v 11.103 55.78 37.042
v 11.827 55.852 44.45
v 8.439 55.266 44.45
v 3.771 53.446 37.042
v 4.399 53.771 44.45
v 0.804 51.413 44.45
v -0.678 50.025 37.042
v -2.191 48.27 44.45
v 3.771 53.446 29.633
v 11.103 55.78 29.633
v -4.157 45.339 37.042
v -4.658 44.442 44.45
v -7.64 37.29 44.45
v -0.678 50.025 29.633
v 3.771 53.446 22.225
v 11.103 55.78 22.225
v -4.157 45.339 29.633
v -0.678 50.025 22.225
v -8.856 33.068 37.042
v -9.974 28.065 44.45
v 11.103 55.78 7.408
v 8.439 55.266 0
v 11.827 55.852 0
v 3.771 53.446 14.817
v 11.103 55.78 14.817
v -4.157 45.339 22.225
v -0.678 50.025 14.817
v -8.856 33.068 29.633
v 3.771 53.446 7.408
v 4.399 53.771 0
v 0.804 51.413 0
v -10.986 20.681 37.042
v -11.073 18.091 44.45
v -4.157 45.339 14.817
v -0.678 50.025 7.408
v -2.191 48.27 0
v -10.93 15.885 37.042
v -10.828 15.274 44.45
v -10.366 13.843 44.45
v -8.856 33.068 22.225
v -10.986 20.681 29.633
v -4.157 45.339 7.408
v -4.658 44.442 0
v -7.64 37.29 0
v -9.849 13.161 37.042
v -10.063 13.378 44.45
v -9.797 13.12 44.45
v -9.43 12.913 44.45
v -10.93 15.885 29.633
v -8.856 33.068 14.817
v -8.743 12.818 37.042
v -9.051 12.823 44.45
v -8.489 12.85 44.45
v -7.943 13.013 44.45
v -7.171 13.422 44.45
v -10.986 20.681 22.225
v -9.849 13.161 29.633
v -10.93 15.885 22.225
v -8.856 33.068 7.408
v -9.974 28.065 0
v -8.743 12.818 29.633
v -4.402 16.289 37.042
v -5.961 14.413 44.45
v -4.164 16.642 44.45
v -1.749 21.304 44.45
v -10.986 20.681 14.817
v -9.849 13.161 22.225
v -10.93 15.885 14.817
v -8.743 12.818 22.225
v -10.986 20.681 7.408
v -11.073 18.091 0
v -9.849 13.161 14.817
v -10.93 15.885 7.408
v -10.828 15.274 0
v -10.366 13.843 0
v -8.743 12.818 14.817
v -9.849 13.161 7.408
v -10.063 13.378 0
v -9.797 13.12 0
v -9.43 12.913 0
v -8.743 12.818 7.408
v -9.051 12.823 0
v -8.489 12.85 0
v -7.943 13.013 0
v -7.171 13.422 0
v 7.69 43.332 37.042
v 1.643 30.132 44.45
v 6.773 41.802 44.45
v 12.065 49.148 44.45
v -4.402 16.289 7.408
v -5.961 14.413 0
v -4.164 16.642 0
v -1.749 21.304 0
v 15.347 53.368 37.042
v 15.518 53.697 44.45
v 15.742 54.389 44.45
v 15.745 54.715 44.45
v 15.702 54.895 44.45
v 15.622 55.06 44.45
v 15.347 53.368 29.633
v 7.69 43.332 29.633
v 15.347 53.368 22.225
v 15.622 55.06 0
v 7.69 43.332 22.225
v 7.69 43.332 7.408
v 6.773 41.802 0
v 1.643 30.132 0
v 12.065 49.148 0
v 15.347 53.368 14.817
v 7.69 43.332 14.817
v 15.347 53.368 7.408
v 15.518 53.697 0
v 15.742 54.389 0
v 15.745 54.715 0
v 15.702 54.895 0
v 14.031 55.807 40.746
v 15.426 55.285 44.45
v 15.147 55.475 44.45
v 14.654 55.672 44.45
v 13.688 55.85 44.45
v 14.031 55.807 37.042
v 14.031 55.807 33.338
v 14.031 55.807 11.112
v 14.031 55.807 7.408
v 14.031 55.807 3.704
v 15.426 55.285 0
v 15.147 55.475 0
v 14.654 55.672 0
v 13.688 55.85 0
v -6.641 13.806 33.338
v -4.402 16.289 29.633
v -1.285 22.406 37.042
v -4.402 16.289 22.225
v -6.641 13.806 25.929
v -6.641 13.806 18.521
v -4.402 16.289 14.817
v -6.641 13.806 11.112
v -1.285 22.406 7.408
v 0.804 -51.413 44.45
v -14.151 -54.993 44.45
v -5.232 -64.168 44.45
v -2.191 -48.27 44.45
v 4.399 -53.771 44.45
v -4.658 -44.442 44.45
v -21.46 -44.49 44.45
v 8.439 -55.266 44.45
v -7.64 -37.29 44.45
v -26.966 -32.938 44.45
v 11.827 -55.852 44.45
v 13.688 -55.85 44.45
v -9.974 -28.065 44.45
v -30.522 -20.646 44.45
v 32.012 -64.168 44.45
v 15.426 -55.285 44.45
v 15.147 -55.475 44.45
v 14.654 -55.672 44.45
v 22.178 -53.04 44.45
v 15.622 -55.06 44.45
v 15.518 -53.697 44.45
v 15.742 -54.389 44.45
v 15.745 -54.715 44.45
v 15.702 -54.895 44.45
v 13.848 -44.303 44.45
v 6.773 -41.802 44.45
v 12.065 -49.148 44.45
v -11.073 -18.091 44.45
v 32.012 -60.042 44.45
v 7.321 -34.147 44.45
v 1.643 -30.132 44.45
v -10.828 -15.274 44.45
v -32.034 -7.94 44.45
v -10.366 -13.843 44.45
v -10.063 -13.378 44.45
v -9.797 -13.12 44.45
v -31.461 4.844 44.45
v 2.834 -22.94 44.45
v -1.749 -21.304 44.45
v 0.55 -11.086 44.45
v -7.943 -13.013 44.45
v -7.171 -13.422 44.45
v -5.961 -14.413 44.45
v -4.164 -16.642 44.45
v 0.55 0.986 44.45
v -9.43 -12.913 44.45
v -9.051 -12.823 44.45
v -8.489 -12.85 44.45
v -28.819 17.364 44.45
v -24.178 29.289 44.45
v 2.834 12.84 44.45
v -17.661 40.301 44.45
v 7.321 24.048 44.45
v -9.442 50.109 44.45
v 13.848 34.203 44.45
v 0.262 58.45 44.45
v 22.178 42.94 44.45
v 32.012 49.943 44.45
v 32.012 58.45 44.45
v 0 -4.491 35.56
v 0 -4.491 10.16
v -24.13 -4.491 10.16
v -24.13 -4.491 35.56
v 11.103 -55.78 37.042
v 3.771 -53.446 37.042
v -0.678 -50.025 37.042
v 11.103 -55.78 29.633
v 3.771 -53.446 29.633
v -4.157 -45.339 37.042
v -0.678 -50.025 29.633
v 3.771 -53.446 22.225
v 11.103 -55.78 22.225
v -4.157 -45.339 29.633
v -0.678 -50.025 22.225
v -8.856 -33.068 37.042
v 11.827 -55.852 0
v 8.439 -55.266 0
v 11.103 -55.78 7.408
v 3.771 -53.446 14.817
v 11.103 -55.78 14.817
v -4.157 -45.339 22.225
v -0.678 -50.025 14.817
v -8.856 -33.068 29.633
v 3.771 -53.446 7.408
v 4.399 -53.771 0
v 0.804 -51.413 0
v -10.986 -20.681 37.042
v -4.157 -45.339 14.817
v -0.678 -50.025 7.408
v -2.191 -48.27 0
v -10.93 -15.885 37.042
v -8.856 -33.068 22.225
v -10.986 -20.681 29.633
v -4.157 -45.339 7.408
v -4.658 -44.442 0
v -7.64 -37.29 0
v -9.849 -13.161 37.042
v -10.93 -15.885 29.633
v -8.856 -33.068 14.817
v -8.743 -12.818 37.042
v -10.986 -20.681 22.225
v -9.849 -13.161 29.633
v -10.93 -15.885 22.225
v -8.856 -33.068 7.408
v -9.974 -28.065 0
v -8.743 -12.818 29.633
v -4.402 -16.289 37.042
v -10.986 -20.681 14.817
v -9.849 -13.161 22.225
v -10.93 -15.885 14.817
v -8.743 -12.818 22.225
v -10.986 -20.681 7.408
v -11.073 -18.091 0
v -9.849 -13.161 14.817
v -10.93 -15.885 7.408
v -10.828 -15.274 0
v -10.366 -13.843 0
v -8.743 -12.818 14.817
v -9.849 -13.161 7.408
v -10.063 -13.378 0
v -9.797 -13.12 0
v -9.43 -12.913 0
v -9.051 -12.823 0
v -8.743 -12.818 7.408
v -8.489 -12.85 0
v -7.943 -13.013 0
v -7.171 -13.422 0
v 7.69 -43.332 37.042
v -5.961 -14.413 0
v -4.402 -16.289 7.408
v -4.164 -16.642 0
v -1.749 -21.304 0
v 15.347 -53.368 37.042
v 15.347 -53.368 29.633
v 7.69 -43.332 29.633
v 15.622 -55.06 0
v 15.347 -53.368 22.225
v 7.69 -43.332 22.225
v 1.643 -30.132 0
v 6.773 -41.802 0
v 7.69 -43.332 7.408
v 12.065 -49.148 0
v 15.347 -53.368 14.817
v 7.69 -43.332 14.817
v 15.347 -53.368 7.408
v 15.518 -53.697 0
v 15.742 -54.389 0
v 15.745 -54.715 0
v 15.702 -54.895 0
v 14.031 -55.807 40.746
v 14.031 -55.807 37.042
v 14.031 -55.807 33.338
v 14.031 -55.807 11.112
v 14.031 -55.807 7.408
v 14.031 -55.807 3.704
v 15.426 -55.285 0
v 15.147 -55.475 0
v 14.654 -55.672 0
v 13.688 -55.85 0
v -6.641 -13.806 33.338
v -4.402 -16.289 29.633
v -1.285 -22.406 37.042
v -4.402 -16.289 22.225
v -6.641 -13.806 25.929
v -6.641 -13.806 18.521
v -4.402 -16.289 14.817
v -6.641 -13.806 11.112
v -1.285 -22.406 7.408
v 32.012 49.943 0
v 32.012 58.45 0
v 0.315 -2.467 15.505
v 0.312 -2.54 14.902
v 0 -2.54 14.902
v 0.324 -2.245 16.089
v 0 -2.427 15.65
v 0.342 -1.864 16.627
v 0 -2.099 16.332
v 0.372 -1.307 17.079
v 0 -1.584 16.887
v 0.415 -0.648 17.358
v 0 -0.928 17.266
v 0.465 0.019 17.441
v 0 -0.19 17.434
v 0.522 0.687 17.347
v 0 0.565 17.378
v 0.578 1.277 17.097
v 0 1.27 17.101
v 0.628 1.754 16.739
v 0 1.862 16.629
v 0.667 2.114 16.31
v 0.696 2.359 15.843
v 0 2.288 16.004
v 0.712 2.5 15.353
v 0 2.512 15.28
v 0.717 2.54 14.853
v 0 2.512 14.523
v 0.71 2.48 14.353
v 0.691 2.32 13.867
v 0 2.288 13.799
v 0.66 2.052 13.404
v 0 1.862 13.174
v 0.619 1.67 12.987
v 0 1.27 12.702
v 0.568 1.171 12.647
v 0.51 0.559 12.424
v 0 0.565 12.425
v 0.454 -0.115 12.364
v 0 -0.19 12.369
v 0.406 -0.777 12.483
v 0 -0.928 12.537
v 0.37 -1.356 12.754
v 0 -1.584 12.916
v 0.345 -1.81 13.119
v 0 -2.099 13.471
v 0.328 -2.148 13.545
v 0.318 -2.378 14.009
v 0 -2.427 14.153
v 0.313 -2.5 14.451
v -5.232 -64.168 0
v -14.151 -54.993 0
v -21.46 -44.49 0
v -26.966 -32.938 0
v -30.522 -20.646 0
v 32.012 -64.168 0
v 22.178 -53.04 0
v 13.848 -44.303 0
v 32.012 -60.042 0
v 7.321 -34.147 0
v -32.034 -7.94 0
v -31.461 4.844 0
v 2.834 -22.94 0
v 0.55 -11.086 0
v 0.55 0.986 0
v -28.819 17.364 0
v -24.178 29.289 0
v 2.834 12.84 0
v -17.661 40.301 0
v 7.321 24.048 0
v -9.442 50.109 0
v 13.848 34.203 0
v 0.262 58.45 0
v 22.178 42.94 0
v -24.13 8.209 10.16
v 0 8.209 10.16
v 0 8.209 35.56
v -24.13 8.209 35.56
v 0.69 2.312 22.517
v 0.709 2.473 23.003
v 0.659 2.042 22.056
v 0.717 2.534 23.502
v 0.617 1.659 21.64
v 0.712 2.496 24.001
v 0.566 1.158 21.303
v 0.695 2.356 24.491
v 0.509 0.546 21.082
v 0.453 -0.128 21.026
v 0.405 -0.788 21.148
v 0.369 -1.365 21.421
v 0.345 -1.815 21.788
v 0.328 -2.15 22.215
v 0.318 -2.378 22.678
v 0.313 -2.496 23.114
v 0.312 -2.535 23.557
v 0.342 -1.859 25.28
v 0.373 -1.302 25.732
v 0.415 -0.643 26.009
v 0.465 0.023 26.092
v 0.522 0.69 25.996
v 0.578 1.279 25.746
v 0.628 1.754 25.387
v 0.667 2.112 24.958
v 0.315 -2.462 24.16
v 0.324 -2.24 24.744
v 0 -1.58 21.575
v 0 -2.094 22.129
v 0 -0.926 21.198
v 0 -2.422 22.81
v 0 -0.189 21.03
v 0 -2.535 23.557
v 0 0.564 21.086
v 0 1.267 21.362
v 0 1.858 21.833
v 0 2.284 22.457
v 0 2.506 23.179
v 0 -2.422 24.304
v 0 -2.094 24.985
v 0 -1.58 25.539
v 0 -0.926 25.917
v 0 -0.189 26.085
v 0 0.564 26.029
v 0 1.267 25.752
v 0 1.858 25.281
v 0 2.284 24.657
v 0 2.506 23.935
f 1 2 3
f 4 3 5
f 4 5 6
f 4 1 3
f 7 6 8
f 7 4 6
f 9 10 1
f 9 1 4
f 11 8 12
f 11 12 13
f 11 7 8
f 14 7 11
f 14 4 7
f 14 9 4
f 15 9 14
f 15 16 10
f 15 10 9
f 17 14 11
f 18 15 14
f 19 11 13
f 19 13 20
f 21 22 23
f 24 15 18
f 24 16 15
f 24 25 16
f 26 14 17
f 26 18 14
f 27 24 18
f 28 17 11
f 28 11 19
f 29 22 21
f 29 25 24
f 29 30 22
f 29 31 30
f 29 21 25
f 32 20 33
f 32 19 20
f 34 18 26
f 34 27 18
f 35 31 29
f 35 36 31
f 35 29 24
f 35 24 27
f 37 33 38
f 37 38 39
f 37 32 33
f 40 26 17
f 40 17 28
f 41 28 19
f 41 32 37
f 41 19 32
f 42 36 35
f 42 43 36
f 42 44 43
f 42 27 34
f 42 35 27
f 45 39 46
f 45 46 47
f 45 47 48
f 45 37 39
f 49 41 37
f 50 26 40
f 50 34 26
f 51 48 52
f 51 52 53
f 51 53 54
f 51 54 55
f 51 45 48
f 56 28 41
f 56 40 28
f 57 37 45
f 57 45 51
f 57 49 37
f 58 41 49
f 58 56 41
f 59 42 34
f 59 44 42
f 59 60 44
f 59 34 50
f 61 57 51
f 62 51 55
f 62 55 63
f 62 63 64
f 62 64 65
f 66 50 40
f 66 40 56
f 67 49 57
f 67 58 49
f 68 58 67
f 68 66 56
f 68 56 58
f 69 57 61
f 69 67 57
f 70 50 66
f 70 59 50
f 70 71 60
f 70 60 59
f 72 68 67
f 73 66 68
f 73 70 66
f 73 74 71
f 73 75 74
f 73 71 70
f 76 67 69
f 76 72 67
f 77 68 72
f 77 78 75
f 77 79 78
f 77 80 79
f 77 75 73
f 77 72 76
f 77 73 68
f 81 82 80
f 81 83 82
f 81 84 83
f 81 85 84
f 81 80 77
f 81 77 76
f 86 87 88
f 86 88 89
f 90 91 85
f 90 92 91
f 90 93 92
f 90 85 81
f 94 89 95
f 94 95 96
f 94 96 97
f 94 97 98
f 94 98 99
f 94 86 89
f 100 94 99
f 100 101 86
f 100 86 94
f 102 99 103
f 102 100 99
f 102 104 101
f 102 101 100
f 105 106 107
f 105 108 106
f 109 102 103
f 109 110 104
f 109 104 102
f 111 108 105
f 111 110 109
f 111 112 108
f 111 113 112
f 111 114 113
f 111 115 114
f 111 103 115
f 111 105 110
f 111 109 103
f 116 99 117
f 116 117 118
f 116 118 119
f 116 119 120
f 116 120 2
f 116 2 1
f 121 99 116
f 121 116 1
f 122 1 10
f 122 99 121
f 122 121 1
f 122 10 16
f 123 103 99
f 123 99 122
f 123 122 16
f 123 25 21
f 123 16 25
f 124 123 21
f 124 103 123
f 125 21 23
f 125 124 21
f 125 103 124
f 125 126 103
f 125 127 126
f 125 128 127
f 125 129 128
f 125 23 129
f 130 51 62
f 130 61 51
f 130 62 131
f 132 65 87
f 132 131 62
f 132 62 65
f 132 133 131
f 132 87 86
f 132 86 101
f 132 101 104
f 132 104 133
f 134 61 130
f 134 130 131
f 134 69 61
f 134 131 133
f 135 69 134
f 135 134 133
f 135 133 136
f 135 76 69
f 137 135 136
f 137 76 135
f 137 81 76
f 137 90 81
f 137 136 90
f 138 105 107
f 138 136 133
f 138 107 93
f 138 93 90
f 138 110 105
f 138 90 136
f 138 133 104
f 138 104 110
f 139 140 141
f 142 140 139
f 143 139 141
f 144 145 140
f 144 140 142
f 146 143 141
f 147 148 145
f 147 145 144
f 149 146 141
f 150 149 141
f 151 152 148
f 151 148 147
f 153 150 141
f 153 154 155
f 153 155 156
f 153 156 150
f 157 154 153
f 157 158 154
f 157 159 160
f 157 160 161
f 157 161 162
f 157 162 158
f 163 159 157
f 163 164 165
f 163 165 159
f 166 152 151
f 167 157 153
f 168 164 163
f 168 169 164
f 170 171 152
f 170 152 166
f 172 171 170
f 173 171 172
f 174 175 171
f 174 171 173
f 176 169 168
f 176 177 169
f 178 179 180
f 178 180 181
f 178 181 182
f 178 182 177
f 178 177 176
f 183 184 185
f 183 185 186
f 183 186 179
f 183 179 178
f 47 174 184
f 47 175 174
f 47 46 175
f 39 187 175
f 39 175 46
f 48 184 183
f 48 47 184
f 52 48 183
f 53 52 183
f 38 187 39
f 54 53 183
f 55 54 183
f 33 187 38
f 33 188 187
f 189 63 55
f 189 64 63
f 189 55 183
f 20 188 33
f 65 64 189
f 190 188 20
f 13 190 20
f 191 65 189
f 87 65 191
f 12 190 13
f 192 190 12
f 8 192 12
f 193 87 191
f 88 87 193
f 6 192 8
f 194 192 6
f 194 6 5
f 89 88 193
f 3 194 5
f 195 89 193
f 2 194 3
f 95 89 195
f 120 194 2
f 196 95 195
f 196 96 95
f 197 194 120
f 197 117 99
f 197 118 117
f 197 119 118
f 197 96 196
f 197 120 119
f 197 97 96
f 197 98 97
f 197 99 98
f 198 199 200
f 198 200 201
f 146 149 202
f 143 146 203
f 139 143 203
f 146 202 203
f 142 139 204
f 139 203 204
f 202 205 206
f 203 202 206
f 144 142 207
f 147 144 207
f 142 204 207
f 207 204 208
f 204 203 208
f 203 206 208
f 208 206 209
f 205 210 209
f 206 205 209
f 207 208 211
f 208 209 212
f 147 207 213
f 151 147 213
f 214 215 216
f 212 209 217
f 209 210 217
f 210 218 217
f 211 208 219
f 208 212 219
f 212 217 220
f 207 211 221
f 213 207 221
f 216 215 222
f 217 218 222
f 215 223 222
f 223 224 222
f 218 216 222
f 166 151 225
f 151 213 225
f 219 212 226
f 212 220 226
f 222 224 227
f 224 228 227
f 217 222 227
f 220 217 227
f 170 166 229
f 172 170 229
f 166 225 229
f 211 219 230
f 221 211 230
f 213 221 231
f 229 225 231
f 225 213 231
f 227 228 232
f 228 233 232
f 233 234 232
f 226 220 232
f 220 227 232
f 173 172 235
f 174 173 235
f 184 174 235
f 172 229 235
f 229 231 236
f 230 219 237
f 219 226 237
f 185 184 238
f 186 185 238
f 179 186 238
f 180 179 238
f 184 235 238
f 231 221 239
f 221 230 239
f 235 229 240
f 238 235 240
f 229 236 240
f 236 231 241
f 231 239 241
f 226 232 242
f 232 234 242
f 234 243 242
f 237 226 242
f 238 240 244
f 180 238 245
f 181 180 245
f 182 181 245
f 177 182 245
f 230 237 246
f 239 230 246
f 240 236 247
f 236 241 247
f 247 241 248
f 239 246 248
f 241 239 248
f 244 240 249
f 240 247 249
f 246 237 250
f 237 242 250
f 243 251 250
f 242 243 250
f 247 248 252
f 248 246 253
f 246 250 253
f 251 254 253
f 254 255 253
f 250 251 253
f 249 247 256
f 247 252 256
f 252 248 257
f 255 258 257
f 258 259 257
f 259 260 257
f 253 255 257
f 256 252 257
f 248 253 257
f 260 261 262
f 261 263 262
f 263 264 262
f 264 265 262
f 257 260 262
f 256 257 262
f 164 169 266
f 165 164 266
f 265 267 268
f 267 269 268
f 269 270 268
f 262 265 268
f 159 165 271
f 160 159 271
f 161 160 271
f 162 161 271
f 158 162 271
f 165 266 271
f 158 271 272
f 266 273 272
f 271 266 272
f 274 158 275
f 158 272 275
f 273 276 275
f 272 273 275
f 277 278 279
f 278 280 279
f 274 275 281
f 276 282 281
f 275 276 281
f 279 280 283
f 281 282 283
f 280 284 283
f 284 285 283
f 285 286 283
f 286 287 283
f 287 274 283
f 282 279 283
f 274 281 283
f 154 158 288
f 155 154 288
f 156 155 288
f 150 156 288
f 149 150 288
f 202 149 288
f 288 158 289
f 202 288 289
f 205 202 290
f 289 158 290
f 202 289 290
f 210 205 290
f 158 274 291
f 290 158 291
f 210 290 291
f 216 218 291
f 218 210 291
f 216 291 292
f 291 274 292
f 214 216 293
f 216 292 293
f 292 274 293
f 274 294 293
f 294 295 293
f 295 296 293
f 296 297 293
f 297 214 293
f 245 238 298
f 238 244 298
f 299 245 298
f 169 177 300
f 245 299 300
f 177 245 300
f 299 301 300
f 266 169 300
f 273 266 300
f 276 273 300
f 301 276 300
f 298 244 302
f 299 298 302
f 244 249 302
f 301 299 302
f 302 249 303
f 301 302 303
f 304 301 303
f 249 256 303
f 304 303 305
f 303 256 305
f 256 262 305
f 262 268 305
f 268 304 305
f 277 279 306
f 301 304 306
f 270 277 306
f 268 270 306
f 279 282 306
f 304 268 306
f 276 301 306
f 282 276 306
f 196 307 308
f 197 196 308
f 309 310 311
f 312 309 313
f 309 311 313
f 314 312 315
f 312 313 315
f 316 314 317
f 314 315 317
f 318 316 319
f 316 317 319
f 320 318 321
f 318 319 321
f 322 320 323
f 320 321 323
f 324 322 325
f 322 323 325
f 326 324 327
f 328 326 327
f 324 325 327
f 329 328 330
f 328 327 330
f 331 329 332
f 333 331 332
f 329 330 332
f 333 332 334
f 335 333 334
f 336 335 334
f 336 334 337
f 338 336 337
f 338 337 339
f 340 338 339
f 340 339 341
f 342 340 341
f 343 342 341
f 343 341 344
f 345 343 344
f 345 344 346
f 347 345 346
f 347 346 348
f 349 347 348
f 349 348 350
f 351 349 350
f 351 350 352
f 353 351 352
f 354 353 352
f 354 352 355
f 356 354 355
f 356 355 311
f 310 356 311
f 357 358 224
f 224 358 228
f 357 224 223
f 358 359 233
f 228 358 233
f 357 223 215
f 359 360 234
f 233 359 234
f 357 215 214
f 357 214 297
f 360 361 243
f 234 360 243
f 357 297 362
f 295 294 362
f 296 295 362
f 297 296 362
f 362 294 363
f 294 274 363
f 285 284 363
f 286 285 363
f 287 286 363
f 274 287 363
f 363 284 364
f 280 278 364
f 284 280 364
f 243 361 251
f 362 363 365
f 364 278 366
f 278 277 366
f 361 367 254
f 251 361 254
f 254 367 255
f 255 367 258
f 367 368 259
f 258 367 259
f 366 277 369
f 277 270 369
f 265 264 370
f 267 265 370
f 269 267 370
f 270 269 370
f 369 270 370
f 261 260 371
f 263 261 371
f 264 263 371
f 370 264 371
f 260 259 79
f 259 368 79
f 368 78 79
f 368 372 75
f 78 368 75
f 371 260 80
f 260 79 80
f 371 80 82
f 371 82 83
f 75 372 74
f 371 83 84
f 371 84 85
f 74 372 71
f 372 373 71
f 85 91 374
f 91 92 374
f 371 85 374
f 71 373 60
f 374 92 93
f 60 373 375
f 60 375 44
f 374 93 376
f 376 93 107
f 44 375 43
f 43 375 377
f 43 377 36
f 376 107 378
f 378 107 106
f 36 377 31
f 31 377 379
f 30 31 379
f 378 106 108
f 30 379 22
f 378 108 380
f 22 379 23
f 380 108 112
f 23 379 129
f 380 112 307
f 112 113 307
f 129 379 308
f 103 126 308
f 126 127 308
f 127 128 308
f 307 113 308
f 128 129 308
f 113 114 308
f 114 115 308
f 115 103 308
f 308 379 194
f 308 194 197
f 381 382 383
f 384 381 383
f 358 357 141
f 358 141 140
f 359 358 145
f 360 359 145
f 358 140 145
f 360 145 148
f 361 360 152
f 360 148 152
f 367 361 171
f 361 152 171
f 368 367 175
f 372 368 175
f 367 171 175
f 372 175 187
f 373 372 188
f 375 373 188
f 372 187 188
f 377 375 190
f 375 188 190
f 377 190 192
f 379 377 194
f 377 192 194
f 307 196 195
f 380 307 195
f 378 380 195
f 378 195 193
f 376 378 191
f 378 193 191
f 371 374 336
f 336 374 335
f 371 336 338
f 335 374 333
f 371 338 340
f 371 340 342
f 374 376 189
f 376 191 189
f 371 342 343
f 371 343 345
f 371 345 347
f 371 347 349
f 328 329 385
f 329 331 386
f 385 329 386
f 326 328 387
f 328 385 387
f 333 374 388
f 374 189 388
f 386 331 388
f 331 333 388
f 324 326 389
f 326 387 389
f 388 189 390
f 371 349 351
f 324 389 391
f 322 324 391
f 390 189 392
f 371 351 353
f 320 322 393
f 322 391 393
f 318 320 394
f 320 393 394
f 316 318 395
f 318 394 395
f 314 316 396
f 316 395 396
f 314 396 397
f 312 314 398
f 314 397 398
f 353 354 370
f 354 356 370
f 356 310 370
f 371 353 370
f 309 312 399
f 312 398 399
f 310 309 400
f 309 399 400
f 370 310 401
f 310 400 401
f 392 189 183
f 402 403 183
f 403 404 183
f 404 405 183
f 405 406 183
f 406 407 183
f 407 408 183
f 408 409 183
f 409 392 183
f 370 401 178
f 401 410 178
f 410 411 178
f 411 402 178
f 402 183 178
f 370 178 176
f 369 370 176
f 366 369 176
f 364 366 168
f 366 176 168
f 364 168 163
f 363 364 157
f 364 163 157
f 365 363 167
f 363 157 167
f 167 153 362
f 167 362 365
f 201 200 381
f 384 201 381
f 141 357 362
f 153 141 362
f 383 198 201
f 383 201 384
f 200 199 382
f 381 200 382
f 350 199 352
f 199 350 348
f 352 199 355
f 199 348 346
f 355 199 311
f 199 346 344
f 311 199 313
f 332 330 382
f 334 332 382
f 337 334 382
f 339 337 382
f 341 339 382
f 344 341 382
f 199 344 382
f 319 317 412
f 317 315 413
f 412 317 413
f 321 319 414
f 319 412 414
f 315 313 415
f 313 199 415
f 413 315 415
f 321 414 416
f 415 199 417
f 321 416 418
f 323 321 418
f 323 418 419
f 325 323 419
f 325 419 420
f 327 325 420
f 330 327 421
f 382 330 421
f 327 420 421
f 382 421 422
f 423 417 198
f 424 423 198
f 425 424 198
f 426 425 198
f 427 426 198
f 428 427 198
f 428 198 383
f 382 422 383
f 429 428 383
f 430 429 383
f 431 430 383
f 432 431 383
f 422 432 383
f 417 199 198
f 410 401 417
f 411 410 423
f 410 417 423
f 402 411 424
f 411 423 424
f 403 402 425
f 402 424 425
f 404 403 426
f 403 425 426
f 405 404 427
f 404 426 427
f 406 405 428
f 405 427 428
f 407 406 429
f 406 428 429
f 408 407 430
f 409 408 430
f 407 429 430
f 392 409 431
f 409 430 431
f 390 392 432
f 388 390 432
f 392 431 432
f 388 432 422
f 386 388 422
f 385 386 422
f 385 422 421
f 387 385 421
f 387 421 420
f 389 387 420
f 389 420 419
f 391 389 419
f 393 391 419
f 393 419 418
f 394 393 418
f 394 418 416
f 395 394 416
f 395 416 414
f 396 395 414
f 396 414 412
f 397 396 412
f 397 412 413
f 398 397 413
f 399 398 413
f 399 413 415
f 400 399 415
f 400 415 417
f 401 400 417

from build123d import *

# Parameters (mm, degrees)
F0_W      = 127
F0_H      = 127
F1_DEPTH  = 44.45
F3_DEPTH  = 44.45
F5_DEPTH  = 44.45
F7_DEPTH  = 46.06675
F8_W      = 32.0189083815
F8_H      = 8.9123969463
F9_DEPTH  = 44.45
F10_W     = 31.75
F10_H     = 19.9242069336
F11_DEPTH = 44.45
F12_W     = 12.7
F12_H     = 25.4
F13_DEPTH = 24.13
F14_R     = 2.54
F14_R_2   = 2.5348059879
F15_DEPTH = 25.4
F17_DEPTH = 44.45
F18_W     = 44.9046668708
F18_H     = 4.3814008621
F19_DEPTH = 44.45
F20_DEPTH = 25


with BuildPart() as f1:
    # F0 (on Top) → F1 (new body)
    with BuildSketch(Plane.XY):
        with Locations((0.2620890737, -5.0497795728)):
            Rectangle(F0_W, F0_H)
    extrude(amount=F1_DEPTH)

    # F2 (on face) → F3 (cut, through all)
    with BuildSketch(Plane.XY.offset(44.45)):
        with BuildLine():
            Line((0.2620890737, 58.4502204272), (-63.2379109263, 58.4502204272))
            Line((-63.2379109263, 58.4502204272), (-63.2379109263, -68.5497795728))
            Line((-63.2379109263, -68.5497795728), (0.2620890737, -68.5497795728))
            ThreePointArc((0.2620890737, -68.5497795728), (-32.0874591554, -5.0497795728), (0.2620890737, 58.4502204272))
        make_face()
    extrude(amount=-F3_DEPTH, mode=Mode.SUBTRACT)

    # F4 (on face) → F5 (cut, through all)
    with BuildSketch(Plane.XY.offset(44.45)):
        with BuildLine():
            Line((63.7620890737, -68.5497795728), (63.7620890737, 58.4502204272))
            ThreePointArc((63.7620890737, 58.4502204272), (0.2620890737, -5.0497795728), (63.7620890737, -68.5497795728))
        make_face()
    extrude(amount=-F5_DEPTH, mode=Mode.SUBTRACT)

    # F6 (on face) → F7 (cut)
    with BuildSketch(Plane.XY.offset(44.45)):
        with BuildLine():
            Line((45.0293794274, -68.5497795728), (45.0293794274, -99.4110107422))
            Line((45.0293794274, -99.4110107422), (83.5961028934, -99.4110107422))
            Line((83.5961028934, -99.4110107422), (83.5961028934, 124.6481090784))
            Line((83.5961028934, 124.6481090784), (45.0293794274, 124.6481090784))
            Line((45.0293794274, 124.6481090784), (45.0293794274, 58.4502204272))
            Line((45.0293794274, 58.4502204272), (63.7620890737, 58.4502204272))
            ThreePointArc((63.7620890737, 58.4502204272), (54.2897526998, 57.7397485638), (45.0293794274, 55.6242312498))
            Line((45.0293794274, 55.6242312498), (45.0293794274, -65.7237903955))
            ThreePointArc((45.0293794274, -65.7237903955), (54.2897526998, -67.8393077095), (63.7620890737, -68.5497795728))
            Line((63.7620890737, -68.5497795728), (45.0293794274, -68.5497795728))
        make_face()
    extrude(amount=-F7_DEPTH, mode=Mode.SUBTRACT)

    # F8 (on face) → F9 (cut, through all)
    with BuildSketch(Plane.XY.offset(44.45)):
        with Locations((48.0215432644, -64.0935810997)):
            Rectangle(F8_W, F8_H)
    extrude(amount=-F9_DEPTH, mode=Mode.SUBTRACT)

    # F10 (on face) → F11 (cut, through all)
    with BuildSketch(Plane.XY.offset(44.45)):
        with Locations((47.8870890737, 48.4881169604)):
            Rectangle(F10_W, F10_H)
    extrude(amount=-F11_DEPTH, mode=Mode.SUBTRACT)

    # F12 (on Right) → F13 (cut)
    with BuildSketch(Plane.YZ):
        with Locations((1.8587405793, 22.86)):
            Rectangle(F12_W, F12_H)
    extrude(amount=-F13_DEPTH, mode=Mode.SUBTRACT)

    # F14 (on face) → F15 (cut)
    with BuildSketch(Plane(origin=(0, 0, 0), x_dir=(0, -1, 0), z_dir=(-1, 0, 0))):
        with Locations((0, 14.9015395448)):
            Circle(F14_R)
        with Locations((0, 23.5572663476)):
            Circle(F14_R_2)
    extrude(amount=-F15_DEPTH, mode=Mode.SUBTRACT)

    # F16 (on face) → F17 (cut, through all)
    with BuildSketch(Plane(origin=(0, 0, 0), x_dir=(1, 0, 0), z_dir=(0, 0, -1))):
        with BuildLine():
            add(Edge.make_bspline(
                [(15.6220020726, -55.0599656999), (14.6747045844, -56.5767938839), (-0.3158932357, -55.1873853804), (-9.8195458276, -35.317884945), (-12.6677317866, -9.6008985203), (-1.3687691608, -16.5812854446), (3.9463942773, -43.3135324972), (16.6526734024, -53.4096379614), (15.6220020726, -55.0599656999)],
                knots=[0, 0, 0, 0, 0.1409804606, 0.3405748592, 0.522571634, 0.6247340088, 0.8466115232, 1, 1, 1, 1], degree=3))
        make_face()
        with BuildLine():
            add(Edge.make_bspline(
                [(15.6220020726, 55.0599656999), (14.6747045844, 56.5767938839), (-0.3158932357, 55.1873853804), (-9.8195458276, 35.317884945), (-12.6677317866, 9.6008985203), (-1.3687691608, 16.5812854446), (3.9463942773, 43.3135324972), (16.6526734024, 53.4096379614), (15.6220020726, 55.0599656999)],
                knots=[0, 0, 0, 0, 0.1409804606, 0.3405748592, 0.522571634, 0.6247340088, 0.8466115232, 1, 1, 1, 1], degree=3))
        make_face()
    extrude(amount=-F17_DEPTH, mode=Mode.SUBTRACT)

    # F18 (on face) → F19 (cut, through all)
    with BuildSketch(Plane.XY.offset(44.45)):
        with Locations((9.5597556382, -66.3590791418)):
            Rectangle(F18_W, F18_H)
    extrude(amount=-F19_DEPTH, mode=Mode.SUBTRACT)

    # F2 (on face) → F20 (cut)
    with BuildSketch(Plane.XY.offset(44.45)):
        with BuildLine():
            Line((0.2620890737, 58.4502204272), (-63.2379109263, 58.4502204272))
            Line((-63.2379109263, 58.4502204272), (-63.2379109263, -68.5497795728))
            Line((-63.2379109263, -68.5497795728), (0.2620890737, -68.5497795728))
            ThreePointArc((0.2620890737, -68.5497795728), (-32.0874591554, -5.0497795728), (0.2620890737, 58.4502204272))
        make_face()
    extrude(amount=-F20_DEPTH, mode=Mode.SUBTRACT)


solid = f1.part
